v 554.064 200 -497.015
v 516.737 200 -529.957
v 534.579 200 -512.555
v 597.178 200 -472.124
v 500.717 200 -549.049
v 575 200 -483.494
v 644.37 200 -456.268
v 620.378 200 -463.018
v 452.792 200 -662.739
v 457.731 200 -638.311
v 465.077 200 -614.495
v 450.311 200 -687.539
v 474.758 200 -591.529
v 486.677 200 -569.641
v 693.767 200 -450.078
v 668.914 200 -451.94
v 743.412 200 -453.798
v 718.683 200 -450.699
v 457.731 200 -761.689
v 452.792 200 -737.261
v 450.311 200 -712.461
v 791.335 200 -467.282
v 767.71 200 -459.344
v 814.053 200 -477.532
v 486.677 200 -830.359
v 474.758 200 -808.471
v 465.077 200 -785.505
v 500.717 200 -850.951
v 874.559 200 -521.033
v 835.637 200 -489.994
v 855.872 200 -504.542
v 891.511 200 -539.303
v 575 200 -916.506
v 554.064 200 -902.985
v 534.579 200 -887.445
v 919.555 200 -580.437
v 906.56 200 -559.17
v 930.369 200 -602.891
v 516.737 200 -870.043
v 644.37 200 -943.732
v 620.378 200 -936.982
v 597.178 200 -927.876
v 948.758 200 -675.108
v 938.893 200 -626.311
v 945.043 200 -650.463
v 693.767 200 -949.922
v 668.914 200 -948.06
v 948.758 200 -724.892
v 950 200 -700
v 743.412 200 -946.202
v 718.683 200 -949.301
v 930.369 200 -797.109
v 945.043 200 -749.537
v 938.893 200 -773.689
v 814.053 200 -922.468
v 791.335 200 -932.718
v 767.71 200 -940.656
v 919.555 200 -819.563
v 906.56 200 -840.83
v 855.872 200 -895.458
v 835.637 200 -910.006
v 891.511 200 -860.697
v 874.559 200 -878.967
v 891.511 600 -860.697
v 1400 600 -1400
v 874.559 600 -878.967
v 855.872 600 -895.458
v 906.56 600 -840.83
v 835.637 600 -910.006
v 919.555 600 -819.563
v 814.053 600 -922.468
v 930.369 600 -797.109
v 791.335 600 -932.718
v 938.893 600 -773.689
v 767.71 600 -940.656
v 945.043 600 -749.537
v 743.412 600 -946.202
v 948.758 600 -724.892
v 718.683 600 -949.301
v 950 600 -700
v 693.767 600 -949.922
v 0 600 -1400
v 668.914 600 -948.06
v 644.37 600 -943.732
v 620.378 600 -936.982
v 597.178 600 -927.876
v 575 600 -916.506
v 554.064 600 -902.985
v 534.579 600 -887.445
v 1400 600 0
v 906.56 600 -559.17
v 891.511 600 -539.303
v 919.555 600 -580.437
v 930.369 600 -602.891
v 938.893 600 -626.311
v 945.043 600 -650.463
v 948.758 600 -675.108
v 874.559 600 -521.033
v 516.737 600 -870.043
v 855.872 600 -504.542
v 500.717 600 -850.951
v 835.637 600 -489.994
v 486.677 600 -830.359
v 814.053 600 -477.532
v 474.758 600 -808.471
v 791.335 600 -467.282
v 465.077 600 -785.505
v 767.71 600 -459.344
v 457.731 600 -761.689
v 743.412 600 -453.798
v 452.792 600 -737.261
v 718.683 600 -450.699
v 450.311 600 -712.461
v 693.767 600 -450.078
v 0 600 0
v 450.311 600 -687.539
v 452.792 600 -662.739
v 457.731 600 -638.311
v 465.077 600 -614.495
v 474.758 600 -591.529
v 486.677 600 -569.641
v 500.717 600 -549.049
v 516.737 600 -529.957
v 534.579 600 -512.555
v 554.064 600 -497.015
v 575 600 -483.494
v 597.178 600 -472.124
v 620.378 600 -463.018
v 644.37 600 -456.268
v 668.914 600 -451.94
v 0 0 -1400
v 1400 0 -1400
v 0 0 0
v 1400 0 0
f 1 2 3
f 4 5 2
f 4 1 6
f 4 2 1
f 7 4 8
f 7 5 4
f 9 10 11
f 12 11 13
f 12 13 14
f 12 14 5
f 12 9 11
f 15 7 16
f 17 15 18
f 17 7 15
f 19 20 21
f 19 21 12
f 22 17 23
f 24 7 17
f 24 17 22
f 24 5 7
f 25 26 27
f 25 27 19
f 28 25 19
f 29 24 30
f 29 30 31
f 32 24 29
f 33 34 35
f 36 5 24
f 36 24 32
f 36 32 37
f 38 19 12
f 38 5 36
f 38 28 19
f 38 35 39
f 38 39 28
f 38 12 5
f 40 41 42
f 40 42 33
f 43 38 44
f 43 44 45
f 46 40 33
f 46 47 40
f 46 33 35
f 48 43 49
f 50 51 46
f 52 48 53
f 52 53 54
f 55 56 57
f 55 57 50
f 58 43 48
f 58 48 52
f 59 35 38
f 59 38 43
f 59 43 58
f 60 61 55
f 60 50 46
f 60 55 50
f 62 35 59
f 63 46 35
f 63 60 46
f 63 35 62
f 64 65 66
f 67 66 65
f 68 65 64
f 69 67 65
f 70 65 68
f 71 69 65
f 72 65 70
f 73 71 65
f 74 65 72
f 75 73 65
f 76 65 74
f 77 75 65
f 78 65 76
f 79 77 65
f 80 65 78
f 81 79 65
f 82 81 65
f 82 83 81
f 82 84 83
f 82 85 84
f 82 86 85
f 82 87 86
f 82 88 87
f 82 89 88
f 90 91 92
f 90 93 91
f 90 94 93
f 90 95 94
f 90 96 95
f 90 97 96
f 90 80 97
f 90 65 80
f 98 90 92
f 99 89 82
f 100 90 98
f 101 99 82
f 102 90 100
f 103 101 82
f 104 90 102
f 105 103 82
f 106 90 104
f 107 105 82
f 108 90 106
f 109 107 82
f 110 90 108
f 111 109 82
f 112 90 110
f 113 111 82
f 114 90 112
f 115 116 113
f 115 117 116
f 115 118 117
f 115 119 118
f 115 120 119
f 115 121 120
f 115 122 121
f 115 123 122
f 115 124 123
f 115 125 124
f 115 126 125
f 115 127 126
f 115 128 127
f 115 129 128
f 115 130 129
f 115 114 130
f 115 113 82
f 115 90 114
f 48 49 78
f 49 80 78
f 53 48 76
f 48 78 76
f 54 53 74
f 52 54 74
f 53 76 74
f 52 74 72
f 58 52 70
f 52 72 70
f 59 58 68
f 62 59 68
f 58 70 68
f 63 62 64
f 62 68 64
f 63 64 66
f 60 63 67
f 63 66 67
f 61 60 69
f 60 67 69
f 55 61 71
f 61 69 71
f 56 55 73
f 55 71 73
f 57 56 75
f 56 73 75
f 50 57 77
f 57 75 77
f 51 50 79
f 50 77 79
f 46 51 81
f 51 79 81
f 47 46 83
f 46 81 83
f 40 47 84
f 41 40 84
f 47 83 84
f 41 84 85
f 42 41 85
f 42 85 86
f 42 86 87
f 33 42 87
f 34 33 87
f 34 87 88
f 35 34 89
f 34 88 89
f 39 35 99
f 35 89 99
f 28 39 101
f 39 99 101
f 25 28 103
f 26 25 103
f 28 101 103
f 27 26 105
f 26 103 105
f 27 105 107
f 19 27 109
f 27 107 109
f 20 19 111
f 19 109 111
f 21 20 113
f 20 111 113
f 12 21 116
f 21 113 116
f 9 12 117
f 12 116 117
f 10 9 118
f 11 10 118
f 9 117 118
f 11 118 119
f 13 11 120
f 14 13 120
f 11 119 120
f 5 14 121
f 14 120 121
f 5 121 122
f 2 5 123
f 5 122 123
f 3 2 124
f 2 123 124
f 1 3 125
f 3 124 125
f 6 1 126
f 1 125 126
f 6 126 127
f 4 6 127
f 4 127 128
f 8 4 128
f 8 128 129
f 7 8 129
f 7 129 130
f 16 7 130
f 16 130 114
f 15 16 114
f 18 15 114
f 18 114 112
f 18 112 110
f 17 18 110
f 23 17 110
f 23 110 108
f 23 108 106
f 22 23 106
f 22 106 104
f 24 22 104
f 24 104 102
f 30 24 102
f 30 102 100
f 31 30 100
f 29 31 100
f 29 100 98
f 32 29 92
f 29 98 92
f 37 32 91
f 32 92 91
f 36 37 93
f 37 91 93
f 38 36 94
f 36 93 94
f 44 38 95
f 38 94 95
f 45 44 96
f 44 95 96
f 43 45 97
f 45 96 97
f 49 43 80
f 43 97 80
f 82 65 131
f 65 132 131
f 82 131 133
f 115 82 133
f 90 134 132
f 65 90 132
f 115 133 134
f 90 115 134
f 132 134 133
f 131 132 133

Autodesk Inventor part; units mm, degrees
ref_plane "YZ Plane" through (0, 0, 0) normal (1, 0, 0) x (0, 1, 0)
ref_plane "XZ Plane" through (0, 0, 0) normal (0, 1, 0) x (-1, 0, 0)
ref_plane "XY Plane" through (0, 0, 0) normal (0, 0, 1) x (1, 0, 0)
sketch "Boceto1" plane through (0, 0, 0) normal (0, 1, 0) x (-1, 0, 0)
  line L0 (0, 0) -> (-1400, 0)
  line L1 (-1400, 0) -> (-1400, -1400)
  line L2 (-1400, -1400) -> (0, -1400)
  line L3 (0, -1400) -> (0, 0)
  dimension "d0" = 1400
  dimension "d1" = 1400
extrude "Extrusión1" add sketch "Boceto1" along normal blind 600
sketch "Boceto2" plane through (0, 600, 0) normal (0, 1, 0) x (1, 0, 0)
  line L0 (0, 0) -> (800, 0)
  circle A0 centre (700, 700) radius 250
  line L1 (0, 1400) -> (0, 0) projected
  line L2 (1400, 1400) -> (0, 1400) projected
  dimension "d6" = 500
  dimension "d9" = 700
  dimension "d10" = 700
extrude "Extrusión2" cut sketch "Boceto2" against normal blind 400
properties part number "Soporte"
